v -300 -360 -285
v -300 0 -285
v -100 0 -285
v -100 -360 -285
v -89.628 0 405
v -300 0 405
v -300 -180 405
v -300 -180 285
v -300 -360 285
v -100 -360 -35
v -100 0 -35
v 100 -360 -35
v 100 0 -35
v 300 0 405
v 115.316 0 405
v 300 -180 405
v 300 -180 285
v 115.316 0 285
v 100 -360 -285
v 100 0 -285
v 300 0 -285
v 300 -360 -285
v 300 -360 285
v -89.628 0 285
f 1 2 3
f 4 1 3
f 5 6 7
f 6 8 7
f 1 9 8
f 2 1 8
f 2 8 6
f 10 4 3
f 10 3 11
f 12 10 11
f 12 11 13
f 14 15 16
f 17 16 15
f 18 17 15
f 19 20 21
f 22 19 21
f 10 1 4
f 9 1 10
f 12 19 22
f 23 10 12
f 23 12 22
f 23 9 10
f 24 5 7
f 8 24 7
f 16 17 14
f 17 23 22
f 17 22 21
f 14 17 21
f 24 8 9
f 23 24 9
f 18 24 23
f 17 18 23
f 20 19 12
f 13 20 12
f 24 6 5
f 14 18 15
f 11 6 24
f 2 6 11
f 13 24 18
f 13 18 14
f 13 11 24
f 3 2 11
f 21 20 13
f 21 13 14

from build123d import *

# Parameters (mm, degrees)
F0_W      = 600
F0_H      = 570
F1_DEPTH  = 360
F2_W      = 200
F2_H      = 250
F3_DEPTH  = 500
F4_W      = 210.372046
F4_H      = 180
F5_DEPTH  = 120
F7_DEPTH  = 120
F8_W      = 184.683776
F8_H      = 180
F9_DEPTH  = 120
F11_DEPTH = 120


with BuildPart() as f1:
    # F0 (on Front) → F1 (new body)
    with BuildSketch(Plane.XZ):
        Rectangle(F0_W, F0_H)
    extrude(amount=F1_DEPTH)

    # F2 (on face) → F3 (cut)
    with BuildSketch(Plane.XZ.offset(360)):
        with Locations((0, -160)):
            Rectangle(F2_W, F2_H)
    extrude(amount=-F3_DEPTH, mode=Mode.SUBTRACT)

    # F4 (on face) → F5 (join)
    with BuildSketch(Plane.XY.offset(285)):
        with Locations((-194.813977, -90)):
            Rectangle(F4_W, F4_H)
    extrude(amount=F5_DEPTH)

    # F6 (on face) → F7 (cut)
    with BuildSketch(Plane.XY.offset(405)):
        Polygon((-89.627954, -180), (-89.627954, 0), (-300, -180), align=None)
    extrude(amount=-F7_DEPTH, mode=Mode.SUBTRACT)

    # F8 (on face) → F9 (join)
    with BuildSketch(Plane.XY.offset(285)):
        with Locations((207.658112, -90)):
            Rectangle(F8_W, F8_H)
    extrude(amount=F9_DEPTH)

    # F10 (on face) → F11 (cut)
    with BuildSketch(Plane.XY.offset(405)):
        Polygon((300, -180), (115.316224, 0), (115.316224, -180), align=None)
    extrude(amount=-F11_DEPTH, mode=Mode.SUBTRACT)


solid = f1.part
